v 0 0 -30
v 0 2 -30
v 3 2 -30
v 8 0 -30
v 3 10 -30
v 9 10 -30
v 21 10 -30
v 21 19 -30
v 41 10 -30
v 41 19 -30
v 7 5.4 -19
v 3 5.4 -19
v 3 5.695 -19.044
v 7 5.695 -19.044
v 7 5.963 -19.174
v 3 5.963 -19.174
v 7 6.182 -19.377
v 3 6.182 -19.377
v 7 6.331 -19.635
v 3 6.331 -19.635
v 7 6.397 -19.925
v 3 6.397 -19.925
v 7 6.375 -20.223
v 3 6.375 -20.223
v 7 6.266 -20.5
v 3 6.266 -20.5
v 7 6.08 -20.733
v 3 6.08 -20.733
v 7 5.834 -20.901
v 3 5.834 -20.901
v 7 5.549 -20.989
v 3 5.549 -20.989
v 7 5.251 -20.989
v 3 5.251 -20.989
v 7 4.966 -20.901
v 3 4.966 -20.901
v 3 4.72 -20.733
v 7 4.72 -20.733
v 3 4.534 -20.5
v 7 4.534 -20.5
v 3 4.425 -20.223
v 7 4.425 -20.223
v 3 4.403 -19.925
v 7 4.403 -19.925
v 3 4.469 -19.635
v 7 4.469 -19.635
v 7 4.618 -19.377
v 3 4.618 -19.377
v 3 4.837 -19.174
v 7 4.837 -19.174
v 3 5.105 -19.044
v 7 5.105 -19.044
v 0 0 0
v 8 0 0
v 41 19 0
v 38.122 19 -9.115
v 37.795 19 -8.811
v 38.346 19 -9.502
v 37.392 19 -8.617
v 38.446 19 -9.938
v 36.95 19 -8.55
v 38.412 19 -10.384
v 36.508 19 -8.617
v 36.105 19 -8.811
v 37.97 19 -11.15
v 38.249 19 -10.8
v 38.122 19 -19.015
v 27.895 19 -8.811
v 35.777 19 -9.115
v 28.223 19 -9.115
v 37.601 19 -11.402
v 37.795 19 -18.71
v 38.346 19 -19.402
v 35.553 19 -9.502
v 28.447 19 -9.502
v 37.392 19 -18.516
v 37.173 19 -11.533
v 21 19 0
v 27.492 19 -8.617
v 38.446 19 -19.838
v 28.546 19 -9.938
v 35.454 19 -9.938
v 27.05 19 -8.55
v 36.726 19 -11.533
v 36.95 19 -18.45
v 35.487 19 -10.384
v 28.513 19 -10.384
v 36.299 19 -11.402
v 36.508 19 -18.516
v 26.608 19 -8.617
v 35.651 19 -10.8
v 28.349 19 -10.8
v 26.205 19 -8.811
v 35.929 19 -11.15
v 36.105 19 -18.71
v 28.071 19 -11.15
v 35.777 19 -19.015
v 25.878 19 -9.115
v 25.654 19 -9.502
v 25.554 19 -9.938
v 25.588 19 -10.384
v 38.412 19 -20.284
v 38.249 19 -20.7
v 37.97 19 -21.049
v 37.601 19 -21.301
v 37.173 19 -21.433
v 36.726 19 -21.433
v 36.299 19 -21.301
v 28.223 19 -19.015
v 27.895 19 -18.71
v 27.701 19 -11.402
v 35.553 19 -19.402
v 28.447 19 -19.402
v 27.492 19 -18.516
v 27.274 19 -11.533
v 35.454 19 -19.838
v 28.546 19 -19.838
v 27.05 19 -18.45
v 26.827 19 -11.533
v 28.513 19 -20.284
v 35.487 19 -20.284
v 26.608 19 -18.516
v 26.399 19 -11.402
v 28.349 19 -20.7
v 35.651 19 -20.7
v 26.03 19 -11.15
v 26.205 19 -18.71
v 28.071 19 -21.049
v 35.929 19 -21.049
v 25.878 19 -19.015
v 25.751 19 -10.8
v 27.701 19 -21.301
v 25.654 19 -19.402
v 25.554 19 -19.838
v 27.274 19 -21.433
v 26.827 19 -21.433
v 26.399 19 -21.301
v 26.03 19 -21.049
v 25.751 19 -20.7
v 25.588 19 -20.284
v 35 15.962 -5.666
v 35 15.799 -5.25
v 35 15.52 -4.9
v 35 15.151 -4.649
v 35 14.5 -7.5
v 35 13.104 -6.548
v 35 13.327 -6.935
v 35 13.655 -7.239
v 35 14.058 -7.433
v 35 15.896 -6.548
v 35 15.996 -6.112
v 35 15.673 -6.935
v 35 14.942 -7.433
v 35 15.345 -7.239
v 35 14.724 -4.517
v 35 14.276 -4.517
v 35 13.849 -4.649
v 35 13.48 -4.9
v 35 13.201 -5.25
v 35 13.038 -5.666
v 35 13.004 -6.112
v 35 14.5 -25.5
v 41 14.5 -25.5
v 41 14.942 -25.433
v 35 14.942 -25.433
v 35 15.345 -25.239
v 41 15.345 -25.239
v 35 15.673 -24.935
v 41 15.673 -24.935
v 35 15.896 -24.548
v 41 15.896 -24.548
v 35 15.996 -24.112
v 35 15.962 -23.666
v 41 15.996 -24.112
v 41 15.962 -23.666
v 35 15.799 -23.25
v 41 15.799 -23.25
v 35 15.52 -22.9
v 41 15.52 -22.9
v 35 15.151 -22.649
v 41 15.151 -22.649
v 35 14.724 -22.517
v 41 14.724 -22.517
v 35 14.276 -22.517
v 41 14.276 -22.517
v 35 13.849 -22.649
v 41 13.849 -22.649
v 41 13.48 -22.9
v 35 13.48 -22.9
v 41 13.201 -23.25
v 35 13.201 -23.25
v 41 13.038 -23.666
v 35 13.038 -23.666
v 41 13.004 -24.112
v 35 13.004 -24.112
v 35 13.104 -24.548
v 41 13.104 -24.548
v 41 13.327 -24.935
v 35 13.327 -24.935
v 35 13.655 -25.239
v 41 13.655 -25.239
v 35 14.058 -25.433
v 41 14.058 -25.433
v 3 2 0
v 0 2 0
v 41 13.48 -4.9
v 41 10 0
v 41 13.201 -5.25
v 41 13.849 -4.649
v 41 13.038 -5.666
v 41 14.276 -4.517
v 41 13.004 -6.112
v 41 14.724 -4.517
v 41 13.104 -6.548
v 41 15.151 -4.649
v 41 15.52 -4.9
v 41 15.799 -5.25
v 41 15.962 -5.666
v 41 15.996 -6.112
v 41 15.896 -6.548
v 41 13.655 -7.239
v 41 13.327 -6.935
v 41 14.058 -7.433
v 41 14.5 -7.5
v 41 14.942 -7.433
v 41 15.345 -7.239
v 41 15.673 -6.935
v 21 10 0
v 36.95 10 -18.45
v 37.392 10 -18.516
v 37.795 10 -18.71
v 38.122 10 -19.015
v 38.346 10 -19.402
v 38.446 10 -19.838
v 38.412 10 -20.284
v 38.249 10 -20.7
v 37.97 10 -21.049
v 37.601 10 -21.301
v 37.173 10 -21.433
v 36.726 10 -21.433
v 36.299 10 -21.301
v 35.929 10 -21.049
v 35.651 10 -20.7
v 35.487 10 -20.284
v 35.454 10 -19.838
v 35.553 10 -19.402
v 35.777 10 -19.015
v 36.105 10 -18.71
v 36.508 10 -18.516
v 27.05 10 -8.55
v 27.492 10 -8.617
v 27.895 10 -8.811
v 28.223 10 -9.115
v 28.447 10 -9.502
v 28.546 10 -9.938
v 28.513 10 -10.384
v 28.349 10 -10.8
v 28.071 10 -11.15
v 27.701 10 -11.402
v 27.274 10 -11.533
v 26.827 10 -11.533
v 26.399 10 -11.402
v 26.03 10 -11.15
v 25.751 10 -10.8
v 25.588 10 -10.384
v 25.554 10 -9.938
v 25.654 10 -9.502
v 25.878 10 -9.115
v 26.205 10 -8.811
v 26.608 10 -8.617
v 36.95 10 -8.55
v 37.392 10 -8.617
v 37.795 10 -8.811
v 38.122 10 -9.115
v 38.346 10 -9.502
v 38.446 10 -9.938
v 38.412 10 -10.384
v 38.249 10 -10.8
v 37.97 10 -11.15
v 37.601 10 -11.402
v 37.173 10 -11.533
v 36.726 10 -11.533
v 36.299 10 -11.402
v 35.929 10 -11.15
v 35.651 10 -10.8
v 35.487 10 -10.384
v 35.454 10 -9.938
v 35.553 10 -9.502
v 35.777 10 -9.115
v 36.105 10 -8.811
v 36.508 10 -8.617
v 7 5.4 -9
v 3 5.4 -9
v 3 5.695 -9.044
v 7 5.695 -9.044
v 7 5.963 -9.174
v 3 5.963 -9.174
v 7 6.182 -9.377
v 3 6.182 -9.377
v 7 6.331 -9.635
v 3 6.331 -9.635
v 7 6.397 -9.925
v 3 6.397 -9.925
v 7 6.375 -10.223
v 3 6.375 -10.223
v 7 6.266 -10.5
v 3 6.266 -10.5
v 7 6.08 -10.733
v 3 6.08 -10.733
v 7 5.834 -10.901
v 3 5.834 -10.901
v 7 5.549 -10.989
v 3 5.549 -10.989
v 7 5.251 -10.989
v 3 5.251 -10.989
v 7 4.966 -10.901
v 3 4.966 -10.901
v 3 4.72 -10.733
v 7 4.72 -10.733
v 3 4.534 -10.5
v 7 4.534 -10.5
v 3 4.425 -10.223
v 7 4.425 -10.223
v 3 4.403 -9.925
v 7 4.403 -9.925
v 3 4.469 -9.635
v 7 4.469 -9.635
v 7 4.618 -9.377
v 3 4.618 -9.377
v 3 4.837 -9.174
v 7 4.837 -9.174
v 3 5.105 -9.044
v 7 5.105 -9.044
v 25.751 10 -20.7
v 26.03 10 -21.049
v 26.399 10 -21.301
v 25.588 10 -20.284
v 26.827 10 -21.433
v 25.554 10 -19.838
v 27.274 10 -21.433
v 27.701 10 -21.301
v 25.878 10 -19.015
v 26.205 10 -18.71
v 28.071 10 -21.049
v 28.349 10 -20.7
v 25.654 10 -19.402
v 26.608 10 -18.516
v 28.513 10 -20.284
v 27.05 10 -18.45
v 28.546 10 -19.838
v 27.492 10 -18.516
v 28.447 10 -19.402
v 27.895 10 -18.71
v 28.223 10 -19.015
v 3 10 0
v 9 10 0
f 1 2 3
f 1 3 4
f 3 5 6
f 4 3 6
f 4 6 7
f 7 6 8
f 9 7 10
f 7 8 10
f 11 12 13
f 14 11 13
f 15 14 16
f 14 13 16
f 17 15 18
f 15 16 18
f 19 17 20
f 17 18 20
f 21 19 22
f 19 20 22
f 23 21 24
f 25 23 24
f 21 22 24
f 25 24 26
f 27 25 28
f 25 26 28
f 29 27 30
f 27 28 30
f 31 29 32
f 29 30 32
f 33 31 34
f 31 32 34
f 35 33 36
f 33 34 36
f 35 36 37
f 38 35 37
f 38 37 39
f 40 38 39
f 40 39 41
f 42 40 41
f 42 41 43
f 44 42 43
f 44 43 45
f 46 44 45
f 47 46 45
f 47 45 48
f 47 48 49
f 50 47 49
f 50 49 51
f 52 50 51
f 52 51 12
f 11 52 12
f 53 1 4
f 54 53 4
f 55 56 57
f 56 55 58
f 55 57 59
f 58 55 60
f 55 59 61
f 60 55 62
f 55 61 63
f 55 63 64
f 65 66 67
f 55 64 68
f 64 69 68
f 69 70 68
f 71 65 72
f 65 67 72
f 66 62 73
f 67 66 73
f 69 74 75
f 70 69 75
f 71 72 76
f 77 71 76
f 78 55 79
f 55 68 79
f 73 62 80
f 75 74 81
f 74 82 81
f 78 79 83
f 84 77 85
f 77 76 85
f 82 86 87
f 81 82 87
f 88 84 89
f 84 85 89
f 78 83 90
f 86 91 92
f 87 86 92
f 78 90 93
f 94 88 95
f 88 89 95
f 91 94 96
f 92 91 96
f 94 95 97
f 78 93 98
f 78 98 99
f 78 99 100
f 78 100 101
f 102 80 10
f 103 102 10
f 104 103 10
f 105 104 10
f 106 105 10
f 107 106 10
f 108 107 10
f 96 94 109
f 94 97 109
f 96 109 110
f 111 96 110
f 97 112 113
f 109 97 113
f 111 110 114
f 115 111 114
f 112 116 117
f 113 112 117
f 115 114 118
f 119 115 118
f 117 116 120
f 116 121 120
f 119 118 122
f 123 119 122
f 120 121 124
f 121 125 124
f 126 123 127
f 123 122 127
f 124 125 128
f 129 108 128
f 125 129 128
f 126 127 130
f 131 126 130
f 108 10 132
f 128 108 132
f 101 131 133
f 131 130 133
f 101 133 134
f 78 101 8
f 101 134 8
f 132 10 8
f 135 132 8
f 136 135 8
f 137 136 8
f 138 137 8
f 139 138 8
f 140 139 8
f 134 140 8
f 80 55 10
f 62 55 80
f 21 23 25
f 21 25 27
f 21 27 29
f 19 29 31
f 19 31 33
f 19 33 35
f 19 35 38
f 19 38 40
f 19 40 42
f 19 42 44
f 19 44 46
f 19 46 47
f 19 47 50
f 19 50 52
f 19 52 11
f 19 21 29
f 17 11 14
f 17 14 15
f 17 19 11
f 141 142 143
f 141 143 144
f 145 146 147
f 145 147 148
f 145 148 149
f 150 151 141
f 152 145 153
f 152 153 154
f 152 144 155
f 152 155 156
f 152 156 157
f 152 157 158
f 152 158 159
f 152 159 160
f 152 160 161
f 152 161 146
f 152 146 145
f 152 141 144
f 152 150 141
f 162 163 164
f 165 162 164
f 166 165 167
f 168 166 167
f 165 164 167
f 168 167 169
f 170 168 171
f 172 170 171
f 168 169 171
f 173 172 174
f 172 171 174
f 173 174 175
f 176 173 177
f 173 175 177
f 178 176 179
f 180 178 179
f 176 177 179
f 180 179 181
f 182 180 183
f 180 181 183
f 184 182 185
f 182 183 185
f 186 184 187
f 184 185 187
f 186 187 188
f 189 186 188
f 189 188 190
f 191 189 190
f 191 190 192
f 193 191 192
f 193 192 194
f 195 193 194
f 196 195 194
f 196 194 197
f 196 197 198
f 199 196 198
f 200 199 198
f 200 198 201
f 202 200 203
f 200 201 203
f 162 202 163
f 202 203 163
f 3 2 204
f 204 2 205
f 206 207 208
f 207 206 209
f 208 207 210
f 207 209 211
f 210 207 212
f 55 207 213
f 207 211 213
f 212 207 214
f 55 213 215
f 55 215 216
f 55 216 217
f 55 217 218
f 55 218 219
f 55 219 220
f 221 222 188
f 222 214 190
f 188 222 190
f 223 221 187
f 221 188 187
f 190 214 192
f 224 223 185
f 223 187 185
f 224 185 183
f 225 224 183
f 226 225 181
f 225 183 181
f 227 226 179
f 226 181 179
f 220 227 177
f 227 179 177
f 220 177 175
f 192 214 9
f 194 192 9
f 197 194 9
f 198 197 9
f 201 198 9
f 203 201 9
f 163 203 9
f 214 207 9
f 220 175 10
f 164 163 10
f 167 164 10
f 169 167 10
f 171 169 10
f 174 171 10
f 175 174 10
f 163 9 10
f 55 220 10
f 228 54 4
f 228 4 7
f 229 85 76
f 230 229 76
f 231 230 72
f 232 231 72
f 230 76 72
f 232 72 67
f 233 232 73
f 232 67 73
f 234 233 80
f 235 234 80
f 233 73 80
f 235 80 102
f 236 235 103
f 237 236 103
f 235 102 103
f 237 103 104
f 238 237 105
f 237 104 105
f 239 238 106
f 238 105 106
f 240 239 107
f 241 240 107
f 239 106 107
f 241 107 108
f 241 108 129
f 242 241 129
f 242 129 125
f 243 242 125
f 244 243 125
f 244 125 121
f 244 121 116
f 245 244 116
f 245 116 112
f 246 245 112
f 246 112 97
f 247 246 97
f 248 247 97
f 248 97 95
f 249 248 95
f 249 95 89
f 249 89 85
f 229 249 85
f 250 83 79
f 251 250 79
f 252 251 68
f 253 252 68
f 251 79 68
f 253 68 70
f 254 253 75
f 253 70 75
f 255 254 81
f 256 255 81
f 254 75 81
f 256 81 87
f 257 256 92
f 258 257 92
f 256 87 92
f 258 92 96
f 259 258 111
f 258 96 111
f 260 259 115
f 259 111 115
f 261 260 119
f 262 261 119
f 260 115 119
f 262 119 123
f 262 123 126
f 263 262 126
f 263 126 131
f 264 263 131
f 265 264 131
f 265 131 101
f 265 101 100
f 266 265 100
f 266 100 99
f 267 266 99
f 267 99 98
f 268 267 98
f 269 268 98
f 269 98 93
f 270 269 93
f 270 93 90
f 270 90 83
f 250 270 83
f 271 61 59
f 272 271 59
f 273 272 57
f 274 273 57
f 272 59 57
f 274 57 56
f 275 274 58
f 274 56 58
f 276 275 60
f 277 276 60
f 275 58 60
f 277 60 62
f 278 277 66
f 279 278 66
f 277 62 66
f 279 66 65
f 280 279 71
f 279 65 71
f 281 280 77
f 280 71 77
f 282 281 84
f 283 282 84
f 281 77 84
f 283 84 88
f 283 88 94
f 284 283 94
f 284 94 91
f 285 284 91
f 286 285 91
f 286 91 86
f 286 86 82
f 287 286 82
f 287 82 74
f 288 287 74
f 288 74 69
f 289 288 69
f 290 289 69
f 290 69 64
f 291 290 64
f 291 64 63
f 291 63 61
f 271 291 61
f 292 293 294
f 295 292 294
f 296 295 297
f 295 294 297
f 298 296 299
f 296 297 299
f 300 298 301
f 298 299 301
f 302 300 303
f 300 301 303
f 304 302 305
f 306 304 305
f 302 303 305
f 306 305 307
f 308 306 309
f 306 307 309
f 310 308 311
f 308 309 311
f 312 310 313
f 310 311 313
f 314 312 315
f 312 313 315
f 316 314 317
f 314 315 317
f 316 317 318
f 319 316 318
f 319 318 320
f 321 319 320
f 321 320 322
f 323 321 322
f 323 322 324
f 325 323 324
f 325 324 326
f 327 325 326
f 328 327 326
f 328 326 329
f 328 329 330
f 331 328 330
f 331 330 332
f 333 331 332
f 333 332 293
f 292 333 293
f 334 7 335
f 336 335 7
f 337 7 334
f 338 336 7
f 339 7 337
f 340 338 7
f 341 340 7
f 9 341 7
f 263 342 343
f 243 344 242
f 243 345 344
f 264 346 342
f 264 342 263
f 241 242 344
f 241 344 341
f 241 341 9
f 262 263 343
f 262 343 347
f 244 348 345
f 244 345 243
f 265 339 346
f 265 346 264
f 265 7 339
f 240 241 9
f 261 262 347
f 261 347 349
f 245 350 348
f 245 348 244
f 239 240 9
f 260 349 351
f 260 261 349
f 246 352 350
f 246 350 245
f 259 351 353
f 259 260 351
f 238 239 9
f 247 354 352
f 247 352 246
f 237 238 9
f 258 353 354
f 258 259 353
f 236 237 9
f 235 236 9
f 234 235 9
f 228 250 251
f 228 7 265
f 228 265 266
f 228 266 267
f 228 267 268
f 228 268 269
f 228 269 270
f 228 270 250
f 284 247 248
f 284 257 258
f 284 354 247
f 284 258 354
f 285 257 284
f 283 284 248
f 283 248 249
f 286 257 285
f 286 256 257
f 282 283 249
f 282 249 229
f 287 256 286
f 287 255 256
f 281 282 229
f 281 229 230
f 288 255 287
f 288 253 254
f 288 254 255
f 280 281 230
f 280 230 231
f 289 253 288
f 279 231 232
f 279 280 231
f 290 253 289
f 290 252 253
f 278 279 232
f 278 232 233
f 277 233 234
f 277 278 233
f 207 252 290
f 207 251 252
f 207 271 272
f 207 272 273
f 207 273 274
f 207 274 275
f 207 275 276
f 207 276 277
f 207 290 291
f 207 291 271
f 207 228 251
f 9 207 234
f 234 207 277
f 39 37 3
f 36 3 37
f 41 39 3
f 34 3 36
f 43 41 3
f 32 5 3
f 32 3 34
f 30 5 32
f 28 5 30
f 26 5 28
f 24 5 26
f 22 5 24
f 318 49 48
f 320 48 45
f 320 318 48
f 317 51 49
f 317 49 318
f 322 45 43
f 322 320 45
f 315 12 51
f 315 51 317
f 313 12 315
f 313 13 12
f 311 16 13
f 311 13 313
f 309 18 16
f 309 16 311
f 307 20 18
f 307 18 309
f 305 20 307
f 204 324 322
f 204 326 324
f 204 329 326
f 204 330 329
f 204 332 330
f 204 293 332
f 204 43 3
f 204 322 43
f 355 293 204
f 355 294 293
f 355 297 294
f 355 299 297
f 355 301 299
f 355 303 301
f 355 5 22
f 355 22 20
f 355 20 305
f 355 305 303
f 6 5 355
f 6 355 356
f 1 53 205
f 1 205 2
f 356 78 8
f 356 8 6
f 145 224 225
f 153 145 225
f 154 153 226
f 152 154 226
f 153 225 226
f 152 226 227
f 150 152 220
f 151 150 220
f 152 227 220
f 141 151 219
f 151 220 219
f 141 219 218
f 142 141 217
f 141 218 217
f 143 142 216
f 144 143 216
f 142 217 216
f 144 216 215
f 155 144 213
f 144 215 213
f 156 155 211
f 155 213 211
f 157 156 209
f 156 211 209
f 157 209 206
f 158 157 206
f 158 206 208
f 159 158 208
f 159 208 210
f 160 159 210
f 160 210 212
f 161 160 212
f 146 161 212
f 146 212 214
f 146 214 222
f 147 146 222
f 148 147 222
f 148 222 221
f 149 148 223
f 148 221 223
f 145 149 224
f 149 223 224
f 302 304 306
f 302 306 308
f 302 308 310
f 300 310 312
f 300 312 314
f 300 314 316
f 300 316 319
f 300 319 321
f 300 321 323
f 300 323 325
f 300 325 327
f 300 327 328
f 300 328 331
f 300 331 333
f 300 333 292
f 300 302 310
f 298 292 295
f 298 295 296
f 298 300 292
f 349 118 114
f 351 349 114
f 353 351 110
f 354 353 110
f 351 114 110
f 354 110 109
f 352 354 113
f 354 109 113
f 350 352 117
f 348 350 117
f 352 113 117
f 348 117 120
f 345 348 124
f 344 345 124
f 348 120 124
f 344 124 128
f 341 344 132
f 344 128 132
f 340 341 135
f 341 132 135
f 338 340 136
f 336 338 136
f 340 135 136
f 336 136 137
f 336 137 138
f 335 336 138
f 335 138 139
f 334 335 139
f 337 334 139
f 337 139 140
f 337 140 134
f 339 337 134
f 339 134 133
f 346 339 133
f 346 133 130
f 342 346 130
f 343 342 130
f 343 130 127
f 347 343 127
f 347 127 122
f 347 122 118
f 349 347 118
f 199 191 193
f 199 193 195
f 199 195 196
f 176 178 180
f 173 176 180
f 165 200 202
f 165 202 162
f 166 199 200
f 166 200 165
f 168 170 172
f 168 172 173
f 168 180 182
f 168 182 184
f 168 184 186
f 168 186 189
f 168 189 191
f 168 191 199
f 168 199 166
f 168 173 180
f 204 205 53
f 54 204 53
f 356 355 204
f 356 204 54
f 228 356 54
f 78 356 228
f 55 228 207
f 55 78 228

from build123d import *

# Parameters (mm, degrees)
SKETCH_1_W          = 41
SKETCH_1_H          = 30
SKETCH_1_R          = 1.5
EXTRUDE_1_DEPTH     = 10
SKETCH_3_W          = 30
SKETCH_3_H          = 8
CUT_EXTRUDE_2_DEPTH = 3
SKETCH_4_R          = 1
CUT_EXTRUDE_3_DEPTH = 7
EXTRUDE_3_DEPTH     = 30
SKETCH_6_W          = 20
SKETCH_6_H          = 30
CUT_EXTRUDE_5_DEPTH = 10
SKETCH_2_R          = 1.5
CUT_EXTRUDE_1_DEPTH = 6
SKETCH_8_R          = 1.5
CUT_EXTRUDE_6_DEPTH = 55.240206489
CUT_EXTRUDE_7_DEPTH = 55.240206489


with BuildPart() as part:
    # Эскиз1 → Бобышка-Вытянуть1 (new body)
    with BuildSketch(Plane(origin=(0, 0, 0), x_dir=(1, 0, 0), z_dir=(0, 1, 0))):
        with Locations((20.5, 15)):
            Rectangle(SKETCH_1_W, SKETCH_1_H)
        with Locations(Location((36.949747468, 19.949747468, 0), (0, 0, 270))):
            Circle(SKETCH_1_R, mode=Mode.SUBTRACT)
        with Locations(Location((27.050252532, 19.949747468, 0), (0, 0, 270))):
            Circle(SKETCH_1_R, mode=Mode.SUBTRACT)
        with Locations(Location((36.949747468, 10.050252532, 0), (0, 0, 270))):
            Circle(SKETCH_1_R, mode=Mode.SUBTRACT)
        with Locations(Location((27.050252532, 10.050252532, 0), (0, 0, 270))):
            Circle(SKETCH_1_R, mode=Mode.SUBTRACT)
    extrude(amount=EXTRUDE_1_DEPTH)

    # Эскиз3 → Вырез-Вытянуть2 (cut)
    with BuildSketch(Plane.ZY):
        with Locations((-15, 6)):
            Rectangle(SKETCH_3_W, SKETCH_3_H)
    extrude(amount=-CUT_EXTRUDE_2_DEPTH, mode=Mode.SUBTRACT)

    # Эскиз4 → Вырез-Вытянуть3 (cut)
    with BuildSketch(Plane.ZY):
        with Locations((-20, 5.4)):
            Circle(SKETCH_4_R)
        with Locations((-10, 5.4)):
            Circle(SKETCH_4_R)
    extrude(amount=-CUT_EXTRUDE_3_DEPTH, mode=Mode.SUBTRACT)

    # Эскиз7 → Бобышка-Вытянуть3 (add)
    with BuildSketch(Plane(origin=(0, 0, -30), x_dir=(-1, 0, 0), z_dir=(0, 0, -1))):
        Polygon((-41, 10), (-41, 19), (-21, 19), (-9, 10), align=None)
    extrude(amount=-EXTRUDE_3_DEPTH)

    # Эскиз6 → Вырез-Вытянуть5 (cut)
    with BuildSketch(Plane.XZ):
        with Locations((31, -15)):
            Rectangle(SKETCH_6_W, SKETCH_6_H)
    extrude(amount=-CUT_EXTRUDE_5_DEPTH, mode=Mode.SUBTRACT)

    # Эскиз2 → Вырез-Вытянуть1 (cut)
    with BuildSketch(Plane(origin=(41, 0, 0), x_dir=(0, 0, -1), z_dir=(1, 0, 0))):
        with Locations((6, 14.5)):
            Circle(SKETCH_2_R)
        with Locations((24, 14.5)):
            Circle(SKETCH_2_R)
    extrude(amount=-CUT_EXTRUDE_1_DEPTH, mode=Mode.SUBTRACT)

    # Эскиз8 → Вырез-Вытянуть6 (cut, through all)
    with BuildSketch(Plane(origin=(0, 19, 0), x_dir=(1, 0, 0), z_dir=(0, 1, 0))):
        with Locations(Location((36.949747468, 19.949747468, 0), (0, 0, 270))):
            Circle(SKETCH_8_R)
        with Locations(Location((36.949747468, 10.050252532, 0), (0, 0, 270))):
            Circle(SKETCH_8_R)
        with Locations(Location((27.050252532, 10.050252532, 0), (0, 0, 270))):
            Circle(SKETCH_8_R)
        with Locations(Location((27.050252532, 19.949747468, 0), (0, 0, 270))):
            Circle(SKETCH_8_R)
    extrude(amount=-CUT_EXTRUDE_6_DEPTH, mode=Mode.SUBTRACT)

    # Эскиз9 → Вырез-Вытянуть7 (cut, through all)
    with BuildSketch(Plane(origin=(0, 0, -30), x_dir=(-1, 0, 0), z_dir=(0, 0, -1))):
        Polygon((-21, 10), (-21, 0), (-8, 0), align=None)
    extrude(amount=-CUT_EXTRUDE_7_DEPTH, mode=Mode.SUBTRACT)


solid = part.part
